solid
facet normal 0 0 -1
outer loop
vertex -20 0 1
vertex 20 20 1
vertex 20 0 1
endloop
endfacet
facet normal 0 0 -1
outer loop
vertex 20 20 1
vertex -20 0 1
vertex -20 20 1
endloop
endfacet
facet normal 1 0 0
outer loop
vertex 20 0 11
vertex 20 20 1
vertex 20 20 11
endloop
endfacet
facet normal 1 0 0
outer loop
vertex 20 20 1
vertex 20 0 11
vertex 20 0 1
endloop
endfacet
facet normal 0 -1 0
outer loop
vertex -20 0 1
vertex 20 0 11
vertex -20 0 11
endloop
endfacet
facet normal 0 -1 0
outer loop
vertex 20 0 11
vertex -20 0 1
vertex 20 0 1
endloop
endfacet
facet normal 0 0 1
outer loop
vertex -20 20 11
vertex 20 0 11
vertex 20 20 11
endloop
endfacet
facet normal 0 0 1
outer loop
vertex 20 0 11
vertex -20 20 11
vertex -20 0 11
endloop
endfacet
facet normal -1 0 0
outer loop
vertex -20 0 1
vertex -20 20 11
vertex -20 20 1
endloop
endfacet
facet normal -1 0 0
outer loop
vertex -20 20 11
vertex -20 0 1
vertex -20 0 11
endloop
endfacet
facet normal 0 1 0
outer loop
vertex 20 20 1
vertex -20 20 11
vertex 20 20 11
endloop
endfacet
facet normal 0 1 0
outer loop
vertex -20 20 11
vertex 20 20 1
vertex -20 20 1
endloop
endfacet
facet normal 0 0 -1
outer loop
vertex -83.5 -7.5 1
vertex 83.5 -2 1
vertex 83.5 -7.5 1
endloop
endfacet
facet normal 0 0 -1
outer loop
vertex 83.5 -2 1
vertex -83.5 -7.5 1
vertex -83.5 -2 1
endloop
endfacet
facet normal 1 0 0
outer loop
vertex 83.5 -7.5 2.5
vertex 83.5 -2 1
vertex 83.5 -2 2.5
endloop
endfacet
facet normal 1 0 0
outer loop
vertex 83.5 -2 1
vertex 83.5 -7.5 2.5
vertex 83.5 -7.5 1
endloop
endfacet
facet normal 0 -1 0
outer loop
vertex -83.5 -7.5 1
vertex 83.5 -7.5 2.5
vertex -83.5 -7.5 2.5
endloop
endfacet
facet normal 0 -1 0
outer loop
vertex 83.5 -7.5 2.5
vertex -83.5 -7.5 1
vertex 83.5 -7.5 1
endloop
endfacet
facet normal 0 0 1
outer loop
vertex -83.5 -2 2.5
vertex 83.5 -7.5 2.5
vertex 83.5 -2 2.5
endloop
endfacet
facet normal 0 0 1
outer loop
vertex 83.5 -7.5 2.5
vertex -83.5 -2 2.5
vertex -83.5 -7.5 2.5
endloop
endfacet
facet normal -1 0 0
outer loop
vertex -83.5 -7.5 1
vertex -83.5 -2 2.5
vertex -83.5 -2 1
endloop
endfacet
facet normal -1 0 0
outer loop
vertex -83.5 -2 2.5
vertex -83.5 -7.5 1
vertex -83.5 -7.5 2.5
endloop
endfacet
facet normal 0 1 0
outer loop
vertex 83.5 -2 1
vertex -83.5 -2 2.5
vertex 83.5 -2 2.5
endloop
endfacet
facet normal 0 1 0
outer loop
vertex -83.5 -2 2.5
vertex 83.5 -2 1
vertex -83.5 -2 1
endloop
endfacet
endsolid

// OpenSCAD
// Generated by DescriptiveCAD bootstrap v0.2
  // boundary visualization
  polyhedron(points=[[-34.586832, 83.505000, 0.000000], [34.586832, 83.505000, 0.000000], [34.586832, 83.495000, 0.000000], [-34.586832, 83.495000, 0.000000], [-34.586832, 83.505000, 1.000000], [34.586832, 83.505000, 1.000000], [34.586832, 83.495000, 1.000000], [-34.586832, 83.495000, 1.000000]], faces=[[0, 1, 2, 3], [4, 5, 6, 7], [0, 1, 5, 4], [1, 2, 6, 5], [2, 3, 7, 6], [3, 0, 4, 7]]);
  polyhedron(points=[[34.590368, 83.503536, 0.000000], [83.503536, 34.590368, 0.000000], [83.496464, 34.583297, 0.000000], [34.583297, 83.496464, 0.000000], [34.590368, 83.503536, 1.000000], [83.503536, 34.590368, 1.000000], [83.496464, 34.583297, 1.000000], [34.583297, 83.496464, 1.000000]], faces=[[0, 1, 2, 3], [4, 5, 6, 7], [0, 1, 5, 4], [1, 2, 6, 5], [2, 3, 7, 6], [3, 0, 4, 7]]);
  polyhedron(points=[[83.505000, 34.586832, 0.000000], [83.505000, -34.586832, 0.000000], [83.495000, -34.586832, 0.000000], [83.495000, 34.586832, 0.000000], [83.505000, 34.586832, 1.000000], [83.505000, -34.586832, 1.000000], [83.495000, -34.586832, 1.000000], [83.495000, 34.586832, 1.000000]], faces=[[0, 1, 2, 3], [4, 5, 6, 7], [0, 1, 5, 4], [1, 2, 6, 5], [2, 3, 7, 6], [3, 0, 4, 7]]);
  polyhedron(points=[[83.503536, -34.590368, 0.000000], [34.590368, -83.503536, 0.000000], [34.583297, -83.496464, 0.000000], [83.496464, -34.583297, 0.000000], [83.503536, -34.590368, 1.000000], [34.590368, -83.503536, 1.000000], [34.583297, -83.496464, 1.000000], [83.496464, -34.583297, 1.000000]], faces=[[0, 1, 2, 3], [4, 5, 6, 7], [0, 1, 5, 4], [1, 2, 6, 5], [2, 3, 7, 6], [3, 0, 4, 7]]);
  polyhedron(points=[[34.586832, -83.505000, 0.000000], [-34.586832, -83.505000, 0.000000], [-34.586832, -83.495000, 0.000000], [34.586832, -83.495000, 0.000000], [34.586832, -83.505000, 1.000000], [-34.586832, -83.505000, 1.000000], [-34.586832, -83.495000, 1.000000], [34.586832, -83.495000, 1.000000]], faces=[[0, 1, 2, 3], [4, 5, 6, 7], [0, 1, 5, 4], [1, 2, 6, 5], [2, 3, 7, 6], [3, 0, 4, 7]]);
  polyhedron(points=[[-34.590368, -83.503536, 0.000000], [-83.503536, -34.590368, 0.000000], [-83.496464, -34.583297, 0.000000], [-34.583297, -83.496464, 0.000000], [-34.590368, -83.503536, 1.000000], [-83.503536, -34.590368, 1.000000], [-83.496464, -34.583297, 1.000000], [-34.583297, -83.496464, 1.000000]], faces=[[0, 1, 2, 3], [4, 5, 6, 7], [0, 1, 5, 4], [1, 2, 6, 5], [2, 3, 7, 6], [3, 0, 4, 7]]);
  polyhedron(points=[[-83.505000, -34.586832, 0.000000], [-83.505000, 34.586832, 0.000000], [-83.495000, 34.586832, 0.000000], [-83.495000, -34.586832, 0.000000], [-83.505000, -34.586832, 1.000000], [-83.505000, 34.586832, 1.000000], [-83.495000, 34.586832, 1.000000], [-83.495000, -34.586832, 1.000000]], faces=[[0, 1, 2, 3], [4, 5, 6, 7], [0, 1, 5, 4], [1, 2, 6, 5], [2, 3, 7, 6], [3, 0, 4, 7]]);
  polyhedron(points=[[-83.503536, 34.590368, 0.000000], [-34.590368, 83.503536, 0.000000], [-34.583297, 83.496464, 0.000000], [-83.496464, 34.583297, 0.000000], [-83.503536, 34.590368, 1.000000], [-34.590368, 83.503536, 1.000000], [-34.583297, 83.496464, 1.000000], [-83.496464, 34.583297, 1.000000]], faces=[[0, 1, 2, 3], [4, 5, 6, 7], [0, 1, 5, 4], [1, 2, 6, 5], [2, 3, 7, 6], [3, 0, 4, 7]]);
  translate([0,0,1.0]) linear_extrude(height=10) polygon(points=[[-20.000000, 20.000000], [20.000000, 20.000000], [20.000000, 0.000000], [-20.000000, 0.000000]]);
  translate([0,0,1.0]) linear_extrude(height=1.5) polygon(points=[[-83.500000, -2.000000], [-83.500000, -7.500000], [83.500000, -7.500000], [83.500000, -2.000000]]);
